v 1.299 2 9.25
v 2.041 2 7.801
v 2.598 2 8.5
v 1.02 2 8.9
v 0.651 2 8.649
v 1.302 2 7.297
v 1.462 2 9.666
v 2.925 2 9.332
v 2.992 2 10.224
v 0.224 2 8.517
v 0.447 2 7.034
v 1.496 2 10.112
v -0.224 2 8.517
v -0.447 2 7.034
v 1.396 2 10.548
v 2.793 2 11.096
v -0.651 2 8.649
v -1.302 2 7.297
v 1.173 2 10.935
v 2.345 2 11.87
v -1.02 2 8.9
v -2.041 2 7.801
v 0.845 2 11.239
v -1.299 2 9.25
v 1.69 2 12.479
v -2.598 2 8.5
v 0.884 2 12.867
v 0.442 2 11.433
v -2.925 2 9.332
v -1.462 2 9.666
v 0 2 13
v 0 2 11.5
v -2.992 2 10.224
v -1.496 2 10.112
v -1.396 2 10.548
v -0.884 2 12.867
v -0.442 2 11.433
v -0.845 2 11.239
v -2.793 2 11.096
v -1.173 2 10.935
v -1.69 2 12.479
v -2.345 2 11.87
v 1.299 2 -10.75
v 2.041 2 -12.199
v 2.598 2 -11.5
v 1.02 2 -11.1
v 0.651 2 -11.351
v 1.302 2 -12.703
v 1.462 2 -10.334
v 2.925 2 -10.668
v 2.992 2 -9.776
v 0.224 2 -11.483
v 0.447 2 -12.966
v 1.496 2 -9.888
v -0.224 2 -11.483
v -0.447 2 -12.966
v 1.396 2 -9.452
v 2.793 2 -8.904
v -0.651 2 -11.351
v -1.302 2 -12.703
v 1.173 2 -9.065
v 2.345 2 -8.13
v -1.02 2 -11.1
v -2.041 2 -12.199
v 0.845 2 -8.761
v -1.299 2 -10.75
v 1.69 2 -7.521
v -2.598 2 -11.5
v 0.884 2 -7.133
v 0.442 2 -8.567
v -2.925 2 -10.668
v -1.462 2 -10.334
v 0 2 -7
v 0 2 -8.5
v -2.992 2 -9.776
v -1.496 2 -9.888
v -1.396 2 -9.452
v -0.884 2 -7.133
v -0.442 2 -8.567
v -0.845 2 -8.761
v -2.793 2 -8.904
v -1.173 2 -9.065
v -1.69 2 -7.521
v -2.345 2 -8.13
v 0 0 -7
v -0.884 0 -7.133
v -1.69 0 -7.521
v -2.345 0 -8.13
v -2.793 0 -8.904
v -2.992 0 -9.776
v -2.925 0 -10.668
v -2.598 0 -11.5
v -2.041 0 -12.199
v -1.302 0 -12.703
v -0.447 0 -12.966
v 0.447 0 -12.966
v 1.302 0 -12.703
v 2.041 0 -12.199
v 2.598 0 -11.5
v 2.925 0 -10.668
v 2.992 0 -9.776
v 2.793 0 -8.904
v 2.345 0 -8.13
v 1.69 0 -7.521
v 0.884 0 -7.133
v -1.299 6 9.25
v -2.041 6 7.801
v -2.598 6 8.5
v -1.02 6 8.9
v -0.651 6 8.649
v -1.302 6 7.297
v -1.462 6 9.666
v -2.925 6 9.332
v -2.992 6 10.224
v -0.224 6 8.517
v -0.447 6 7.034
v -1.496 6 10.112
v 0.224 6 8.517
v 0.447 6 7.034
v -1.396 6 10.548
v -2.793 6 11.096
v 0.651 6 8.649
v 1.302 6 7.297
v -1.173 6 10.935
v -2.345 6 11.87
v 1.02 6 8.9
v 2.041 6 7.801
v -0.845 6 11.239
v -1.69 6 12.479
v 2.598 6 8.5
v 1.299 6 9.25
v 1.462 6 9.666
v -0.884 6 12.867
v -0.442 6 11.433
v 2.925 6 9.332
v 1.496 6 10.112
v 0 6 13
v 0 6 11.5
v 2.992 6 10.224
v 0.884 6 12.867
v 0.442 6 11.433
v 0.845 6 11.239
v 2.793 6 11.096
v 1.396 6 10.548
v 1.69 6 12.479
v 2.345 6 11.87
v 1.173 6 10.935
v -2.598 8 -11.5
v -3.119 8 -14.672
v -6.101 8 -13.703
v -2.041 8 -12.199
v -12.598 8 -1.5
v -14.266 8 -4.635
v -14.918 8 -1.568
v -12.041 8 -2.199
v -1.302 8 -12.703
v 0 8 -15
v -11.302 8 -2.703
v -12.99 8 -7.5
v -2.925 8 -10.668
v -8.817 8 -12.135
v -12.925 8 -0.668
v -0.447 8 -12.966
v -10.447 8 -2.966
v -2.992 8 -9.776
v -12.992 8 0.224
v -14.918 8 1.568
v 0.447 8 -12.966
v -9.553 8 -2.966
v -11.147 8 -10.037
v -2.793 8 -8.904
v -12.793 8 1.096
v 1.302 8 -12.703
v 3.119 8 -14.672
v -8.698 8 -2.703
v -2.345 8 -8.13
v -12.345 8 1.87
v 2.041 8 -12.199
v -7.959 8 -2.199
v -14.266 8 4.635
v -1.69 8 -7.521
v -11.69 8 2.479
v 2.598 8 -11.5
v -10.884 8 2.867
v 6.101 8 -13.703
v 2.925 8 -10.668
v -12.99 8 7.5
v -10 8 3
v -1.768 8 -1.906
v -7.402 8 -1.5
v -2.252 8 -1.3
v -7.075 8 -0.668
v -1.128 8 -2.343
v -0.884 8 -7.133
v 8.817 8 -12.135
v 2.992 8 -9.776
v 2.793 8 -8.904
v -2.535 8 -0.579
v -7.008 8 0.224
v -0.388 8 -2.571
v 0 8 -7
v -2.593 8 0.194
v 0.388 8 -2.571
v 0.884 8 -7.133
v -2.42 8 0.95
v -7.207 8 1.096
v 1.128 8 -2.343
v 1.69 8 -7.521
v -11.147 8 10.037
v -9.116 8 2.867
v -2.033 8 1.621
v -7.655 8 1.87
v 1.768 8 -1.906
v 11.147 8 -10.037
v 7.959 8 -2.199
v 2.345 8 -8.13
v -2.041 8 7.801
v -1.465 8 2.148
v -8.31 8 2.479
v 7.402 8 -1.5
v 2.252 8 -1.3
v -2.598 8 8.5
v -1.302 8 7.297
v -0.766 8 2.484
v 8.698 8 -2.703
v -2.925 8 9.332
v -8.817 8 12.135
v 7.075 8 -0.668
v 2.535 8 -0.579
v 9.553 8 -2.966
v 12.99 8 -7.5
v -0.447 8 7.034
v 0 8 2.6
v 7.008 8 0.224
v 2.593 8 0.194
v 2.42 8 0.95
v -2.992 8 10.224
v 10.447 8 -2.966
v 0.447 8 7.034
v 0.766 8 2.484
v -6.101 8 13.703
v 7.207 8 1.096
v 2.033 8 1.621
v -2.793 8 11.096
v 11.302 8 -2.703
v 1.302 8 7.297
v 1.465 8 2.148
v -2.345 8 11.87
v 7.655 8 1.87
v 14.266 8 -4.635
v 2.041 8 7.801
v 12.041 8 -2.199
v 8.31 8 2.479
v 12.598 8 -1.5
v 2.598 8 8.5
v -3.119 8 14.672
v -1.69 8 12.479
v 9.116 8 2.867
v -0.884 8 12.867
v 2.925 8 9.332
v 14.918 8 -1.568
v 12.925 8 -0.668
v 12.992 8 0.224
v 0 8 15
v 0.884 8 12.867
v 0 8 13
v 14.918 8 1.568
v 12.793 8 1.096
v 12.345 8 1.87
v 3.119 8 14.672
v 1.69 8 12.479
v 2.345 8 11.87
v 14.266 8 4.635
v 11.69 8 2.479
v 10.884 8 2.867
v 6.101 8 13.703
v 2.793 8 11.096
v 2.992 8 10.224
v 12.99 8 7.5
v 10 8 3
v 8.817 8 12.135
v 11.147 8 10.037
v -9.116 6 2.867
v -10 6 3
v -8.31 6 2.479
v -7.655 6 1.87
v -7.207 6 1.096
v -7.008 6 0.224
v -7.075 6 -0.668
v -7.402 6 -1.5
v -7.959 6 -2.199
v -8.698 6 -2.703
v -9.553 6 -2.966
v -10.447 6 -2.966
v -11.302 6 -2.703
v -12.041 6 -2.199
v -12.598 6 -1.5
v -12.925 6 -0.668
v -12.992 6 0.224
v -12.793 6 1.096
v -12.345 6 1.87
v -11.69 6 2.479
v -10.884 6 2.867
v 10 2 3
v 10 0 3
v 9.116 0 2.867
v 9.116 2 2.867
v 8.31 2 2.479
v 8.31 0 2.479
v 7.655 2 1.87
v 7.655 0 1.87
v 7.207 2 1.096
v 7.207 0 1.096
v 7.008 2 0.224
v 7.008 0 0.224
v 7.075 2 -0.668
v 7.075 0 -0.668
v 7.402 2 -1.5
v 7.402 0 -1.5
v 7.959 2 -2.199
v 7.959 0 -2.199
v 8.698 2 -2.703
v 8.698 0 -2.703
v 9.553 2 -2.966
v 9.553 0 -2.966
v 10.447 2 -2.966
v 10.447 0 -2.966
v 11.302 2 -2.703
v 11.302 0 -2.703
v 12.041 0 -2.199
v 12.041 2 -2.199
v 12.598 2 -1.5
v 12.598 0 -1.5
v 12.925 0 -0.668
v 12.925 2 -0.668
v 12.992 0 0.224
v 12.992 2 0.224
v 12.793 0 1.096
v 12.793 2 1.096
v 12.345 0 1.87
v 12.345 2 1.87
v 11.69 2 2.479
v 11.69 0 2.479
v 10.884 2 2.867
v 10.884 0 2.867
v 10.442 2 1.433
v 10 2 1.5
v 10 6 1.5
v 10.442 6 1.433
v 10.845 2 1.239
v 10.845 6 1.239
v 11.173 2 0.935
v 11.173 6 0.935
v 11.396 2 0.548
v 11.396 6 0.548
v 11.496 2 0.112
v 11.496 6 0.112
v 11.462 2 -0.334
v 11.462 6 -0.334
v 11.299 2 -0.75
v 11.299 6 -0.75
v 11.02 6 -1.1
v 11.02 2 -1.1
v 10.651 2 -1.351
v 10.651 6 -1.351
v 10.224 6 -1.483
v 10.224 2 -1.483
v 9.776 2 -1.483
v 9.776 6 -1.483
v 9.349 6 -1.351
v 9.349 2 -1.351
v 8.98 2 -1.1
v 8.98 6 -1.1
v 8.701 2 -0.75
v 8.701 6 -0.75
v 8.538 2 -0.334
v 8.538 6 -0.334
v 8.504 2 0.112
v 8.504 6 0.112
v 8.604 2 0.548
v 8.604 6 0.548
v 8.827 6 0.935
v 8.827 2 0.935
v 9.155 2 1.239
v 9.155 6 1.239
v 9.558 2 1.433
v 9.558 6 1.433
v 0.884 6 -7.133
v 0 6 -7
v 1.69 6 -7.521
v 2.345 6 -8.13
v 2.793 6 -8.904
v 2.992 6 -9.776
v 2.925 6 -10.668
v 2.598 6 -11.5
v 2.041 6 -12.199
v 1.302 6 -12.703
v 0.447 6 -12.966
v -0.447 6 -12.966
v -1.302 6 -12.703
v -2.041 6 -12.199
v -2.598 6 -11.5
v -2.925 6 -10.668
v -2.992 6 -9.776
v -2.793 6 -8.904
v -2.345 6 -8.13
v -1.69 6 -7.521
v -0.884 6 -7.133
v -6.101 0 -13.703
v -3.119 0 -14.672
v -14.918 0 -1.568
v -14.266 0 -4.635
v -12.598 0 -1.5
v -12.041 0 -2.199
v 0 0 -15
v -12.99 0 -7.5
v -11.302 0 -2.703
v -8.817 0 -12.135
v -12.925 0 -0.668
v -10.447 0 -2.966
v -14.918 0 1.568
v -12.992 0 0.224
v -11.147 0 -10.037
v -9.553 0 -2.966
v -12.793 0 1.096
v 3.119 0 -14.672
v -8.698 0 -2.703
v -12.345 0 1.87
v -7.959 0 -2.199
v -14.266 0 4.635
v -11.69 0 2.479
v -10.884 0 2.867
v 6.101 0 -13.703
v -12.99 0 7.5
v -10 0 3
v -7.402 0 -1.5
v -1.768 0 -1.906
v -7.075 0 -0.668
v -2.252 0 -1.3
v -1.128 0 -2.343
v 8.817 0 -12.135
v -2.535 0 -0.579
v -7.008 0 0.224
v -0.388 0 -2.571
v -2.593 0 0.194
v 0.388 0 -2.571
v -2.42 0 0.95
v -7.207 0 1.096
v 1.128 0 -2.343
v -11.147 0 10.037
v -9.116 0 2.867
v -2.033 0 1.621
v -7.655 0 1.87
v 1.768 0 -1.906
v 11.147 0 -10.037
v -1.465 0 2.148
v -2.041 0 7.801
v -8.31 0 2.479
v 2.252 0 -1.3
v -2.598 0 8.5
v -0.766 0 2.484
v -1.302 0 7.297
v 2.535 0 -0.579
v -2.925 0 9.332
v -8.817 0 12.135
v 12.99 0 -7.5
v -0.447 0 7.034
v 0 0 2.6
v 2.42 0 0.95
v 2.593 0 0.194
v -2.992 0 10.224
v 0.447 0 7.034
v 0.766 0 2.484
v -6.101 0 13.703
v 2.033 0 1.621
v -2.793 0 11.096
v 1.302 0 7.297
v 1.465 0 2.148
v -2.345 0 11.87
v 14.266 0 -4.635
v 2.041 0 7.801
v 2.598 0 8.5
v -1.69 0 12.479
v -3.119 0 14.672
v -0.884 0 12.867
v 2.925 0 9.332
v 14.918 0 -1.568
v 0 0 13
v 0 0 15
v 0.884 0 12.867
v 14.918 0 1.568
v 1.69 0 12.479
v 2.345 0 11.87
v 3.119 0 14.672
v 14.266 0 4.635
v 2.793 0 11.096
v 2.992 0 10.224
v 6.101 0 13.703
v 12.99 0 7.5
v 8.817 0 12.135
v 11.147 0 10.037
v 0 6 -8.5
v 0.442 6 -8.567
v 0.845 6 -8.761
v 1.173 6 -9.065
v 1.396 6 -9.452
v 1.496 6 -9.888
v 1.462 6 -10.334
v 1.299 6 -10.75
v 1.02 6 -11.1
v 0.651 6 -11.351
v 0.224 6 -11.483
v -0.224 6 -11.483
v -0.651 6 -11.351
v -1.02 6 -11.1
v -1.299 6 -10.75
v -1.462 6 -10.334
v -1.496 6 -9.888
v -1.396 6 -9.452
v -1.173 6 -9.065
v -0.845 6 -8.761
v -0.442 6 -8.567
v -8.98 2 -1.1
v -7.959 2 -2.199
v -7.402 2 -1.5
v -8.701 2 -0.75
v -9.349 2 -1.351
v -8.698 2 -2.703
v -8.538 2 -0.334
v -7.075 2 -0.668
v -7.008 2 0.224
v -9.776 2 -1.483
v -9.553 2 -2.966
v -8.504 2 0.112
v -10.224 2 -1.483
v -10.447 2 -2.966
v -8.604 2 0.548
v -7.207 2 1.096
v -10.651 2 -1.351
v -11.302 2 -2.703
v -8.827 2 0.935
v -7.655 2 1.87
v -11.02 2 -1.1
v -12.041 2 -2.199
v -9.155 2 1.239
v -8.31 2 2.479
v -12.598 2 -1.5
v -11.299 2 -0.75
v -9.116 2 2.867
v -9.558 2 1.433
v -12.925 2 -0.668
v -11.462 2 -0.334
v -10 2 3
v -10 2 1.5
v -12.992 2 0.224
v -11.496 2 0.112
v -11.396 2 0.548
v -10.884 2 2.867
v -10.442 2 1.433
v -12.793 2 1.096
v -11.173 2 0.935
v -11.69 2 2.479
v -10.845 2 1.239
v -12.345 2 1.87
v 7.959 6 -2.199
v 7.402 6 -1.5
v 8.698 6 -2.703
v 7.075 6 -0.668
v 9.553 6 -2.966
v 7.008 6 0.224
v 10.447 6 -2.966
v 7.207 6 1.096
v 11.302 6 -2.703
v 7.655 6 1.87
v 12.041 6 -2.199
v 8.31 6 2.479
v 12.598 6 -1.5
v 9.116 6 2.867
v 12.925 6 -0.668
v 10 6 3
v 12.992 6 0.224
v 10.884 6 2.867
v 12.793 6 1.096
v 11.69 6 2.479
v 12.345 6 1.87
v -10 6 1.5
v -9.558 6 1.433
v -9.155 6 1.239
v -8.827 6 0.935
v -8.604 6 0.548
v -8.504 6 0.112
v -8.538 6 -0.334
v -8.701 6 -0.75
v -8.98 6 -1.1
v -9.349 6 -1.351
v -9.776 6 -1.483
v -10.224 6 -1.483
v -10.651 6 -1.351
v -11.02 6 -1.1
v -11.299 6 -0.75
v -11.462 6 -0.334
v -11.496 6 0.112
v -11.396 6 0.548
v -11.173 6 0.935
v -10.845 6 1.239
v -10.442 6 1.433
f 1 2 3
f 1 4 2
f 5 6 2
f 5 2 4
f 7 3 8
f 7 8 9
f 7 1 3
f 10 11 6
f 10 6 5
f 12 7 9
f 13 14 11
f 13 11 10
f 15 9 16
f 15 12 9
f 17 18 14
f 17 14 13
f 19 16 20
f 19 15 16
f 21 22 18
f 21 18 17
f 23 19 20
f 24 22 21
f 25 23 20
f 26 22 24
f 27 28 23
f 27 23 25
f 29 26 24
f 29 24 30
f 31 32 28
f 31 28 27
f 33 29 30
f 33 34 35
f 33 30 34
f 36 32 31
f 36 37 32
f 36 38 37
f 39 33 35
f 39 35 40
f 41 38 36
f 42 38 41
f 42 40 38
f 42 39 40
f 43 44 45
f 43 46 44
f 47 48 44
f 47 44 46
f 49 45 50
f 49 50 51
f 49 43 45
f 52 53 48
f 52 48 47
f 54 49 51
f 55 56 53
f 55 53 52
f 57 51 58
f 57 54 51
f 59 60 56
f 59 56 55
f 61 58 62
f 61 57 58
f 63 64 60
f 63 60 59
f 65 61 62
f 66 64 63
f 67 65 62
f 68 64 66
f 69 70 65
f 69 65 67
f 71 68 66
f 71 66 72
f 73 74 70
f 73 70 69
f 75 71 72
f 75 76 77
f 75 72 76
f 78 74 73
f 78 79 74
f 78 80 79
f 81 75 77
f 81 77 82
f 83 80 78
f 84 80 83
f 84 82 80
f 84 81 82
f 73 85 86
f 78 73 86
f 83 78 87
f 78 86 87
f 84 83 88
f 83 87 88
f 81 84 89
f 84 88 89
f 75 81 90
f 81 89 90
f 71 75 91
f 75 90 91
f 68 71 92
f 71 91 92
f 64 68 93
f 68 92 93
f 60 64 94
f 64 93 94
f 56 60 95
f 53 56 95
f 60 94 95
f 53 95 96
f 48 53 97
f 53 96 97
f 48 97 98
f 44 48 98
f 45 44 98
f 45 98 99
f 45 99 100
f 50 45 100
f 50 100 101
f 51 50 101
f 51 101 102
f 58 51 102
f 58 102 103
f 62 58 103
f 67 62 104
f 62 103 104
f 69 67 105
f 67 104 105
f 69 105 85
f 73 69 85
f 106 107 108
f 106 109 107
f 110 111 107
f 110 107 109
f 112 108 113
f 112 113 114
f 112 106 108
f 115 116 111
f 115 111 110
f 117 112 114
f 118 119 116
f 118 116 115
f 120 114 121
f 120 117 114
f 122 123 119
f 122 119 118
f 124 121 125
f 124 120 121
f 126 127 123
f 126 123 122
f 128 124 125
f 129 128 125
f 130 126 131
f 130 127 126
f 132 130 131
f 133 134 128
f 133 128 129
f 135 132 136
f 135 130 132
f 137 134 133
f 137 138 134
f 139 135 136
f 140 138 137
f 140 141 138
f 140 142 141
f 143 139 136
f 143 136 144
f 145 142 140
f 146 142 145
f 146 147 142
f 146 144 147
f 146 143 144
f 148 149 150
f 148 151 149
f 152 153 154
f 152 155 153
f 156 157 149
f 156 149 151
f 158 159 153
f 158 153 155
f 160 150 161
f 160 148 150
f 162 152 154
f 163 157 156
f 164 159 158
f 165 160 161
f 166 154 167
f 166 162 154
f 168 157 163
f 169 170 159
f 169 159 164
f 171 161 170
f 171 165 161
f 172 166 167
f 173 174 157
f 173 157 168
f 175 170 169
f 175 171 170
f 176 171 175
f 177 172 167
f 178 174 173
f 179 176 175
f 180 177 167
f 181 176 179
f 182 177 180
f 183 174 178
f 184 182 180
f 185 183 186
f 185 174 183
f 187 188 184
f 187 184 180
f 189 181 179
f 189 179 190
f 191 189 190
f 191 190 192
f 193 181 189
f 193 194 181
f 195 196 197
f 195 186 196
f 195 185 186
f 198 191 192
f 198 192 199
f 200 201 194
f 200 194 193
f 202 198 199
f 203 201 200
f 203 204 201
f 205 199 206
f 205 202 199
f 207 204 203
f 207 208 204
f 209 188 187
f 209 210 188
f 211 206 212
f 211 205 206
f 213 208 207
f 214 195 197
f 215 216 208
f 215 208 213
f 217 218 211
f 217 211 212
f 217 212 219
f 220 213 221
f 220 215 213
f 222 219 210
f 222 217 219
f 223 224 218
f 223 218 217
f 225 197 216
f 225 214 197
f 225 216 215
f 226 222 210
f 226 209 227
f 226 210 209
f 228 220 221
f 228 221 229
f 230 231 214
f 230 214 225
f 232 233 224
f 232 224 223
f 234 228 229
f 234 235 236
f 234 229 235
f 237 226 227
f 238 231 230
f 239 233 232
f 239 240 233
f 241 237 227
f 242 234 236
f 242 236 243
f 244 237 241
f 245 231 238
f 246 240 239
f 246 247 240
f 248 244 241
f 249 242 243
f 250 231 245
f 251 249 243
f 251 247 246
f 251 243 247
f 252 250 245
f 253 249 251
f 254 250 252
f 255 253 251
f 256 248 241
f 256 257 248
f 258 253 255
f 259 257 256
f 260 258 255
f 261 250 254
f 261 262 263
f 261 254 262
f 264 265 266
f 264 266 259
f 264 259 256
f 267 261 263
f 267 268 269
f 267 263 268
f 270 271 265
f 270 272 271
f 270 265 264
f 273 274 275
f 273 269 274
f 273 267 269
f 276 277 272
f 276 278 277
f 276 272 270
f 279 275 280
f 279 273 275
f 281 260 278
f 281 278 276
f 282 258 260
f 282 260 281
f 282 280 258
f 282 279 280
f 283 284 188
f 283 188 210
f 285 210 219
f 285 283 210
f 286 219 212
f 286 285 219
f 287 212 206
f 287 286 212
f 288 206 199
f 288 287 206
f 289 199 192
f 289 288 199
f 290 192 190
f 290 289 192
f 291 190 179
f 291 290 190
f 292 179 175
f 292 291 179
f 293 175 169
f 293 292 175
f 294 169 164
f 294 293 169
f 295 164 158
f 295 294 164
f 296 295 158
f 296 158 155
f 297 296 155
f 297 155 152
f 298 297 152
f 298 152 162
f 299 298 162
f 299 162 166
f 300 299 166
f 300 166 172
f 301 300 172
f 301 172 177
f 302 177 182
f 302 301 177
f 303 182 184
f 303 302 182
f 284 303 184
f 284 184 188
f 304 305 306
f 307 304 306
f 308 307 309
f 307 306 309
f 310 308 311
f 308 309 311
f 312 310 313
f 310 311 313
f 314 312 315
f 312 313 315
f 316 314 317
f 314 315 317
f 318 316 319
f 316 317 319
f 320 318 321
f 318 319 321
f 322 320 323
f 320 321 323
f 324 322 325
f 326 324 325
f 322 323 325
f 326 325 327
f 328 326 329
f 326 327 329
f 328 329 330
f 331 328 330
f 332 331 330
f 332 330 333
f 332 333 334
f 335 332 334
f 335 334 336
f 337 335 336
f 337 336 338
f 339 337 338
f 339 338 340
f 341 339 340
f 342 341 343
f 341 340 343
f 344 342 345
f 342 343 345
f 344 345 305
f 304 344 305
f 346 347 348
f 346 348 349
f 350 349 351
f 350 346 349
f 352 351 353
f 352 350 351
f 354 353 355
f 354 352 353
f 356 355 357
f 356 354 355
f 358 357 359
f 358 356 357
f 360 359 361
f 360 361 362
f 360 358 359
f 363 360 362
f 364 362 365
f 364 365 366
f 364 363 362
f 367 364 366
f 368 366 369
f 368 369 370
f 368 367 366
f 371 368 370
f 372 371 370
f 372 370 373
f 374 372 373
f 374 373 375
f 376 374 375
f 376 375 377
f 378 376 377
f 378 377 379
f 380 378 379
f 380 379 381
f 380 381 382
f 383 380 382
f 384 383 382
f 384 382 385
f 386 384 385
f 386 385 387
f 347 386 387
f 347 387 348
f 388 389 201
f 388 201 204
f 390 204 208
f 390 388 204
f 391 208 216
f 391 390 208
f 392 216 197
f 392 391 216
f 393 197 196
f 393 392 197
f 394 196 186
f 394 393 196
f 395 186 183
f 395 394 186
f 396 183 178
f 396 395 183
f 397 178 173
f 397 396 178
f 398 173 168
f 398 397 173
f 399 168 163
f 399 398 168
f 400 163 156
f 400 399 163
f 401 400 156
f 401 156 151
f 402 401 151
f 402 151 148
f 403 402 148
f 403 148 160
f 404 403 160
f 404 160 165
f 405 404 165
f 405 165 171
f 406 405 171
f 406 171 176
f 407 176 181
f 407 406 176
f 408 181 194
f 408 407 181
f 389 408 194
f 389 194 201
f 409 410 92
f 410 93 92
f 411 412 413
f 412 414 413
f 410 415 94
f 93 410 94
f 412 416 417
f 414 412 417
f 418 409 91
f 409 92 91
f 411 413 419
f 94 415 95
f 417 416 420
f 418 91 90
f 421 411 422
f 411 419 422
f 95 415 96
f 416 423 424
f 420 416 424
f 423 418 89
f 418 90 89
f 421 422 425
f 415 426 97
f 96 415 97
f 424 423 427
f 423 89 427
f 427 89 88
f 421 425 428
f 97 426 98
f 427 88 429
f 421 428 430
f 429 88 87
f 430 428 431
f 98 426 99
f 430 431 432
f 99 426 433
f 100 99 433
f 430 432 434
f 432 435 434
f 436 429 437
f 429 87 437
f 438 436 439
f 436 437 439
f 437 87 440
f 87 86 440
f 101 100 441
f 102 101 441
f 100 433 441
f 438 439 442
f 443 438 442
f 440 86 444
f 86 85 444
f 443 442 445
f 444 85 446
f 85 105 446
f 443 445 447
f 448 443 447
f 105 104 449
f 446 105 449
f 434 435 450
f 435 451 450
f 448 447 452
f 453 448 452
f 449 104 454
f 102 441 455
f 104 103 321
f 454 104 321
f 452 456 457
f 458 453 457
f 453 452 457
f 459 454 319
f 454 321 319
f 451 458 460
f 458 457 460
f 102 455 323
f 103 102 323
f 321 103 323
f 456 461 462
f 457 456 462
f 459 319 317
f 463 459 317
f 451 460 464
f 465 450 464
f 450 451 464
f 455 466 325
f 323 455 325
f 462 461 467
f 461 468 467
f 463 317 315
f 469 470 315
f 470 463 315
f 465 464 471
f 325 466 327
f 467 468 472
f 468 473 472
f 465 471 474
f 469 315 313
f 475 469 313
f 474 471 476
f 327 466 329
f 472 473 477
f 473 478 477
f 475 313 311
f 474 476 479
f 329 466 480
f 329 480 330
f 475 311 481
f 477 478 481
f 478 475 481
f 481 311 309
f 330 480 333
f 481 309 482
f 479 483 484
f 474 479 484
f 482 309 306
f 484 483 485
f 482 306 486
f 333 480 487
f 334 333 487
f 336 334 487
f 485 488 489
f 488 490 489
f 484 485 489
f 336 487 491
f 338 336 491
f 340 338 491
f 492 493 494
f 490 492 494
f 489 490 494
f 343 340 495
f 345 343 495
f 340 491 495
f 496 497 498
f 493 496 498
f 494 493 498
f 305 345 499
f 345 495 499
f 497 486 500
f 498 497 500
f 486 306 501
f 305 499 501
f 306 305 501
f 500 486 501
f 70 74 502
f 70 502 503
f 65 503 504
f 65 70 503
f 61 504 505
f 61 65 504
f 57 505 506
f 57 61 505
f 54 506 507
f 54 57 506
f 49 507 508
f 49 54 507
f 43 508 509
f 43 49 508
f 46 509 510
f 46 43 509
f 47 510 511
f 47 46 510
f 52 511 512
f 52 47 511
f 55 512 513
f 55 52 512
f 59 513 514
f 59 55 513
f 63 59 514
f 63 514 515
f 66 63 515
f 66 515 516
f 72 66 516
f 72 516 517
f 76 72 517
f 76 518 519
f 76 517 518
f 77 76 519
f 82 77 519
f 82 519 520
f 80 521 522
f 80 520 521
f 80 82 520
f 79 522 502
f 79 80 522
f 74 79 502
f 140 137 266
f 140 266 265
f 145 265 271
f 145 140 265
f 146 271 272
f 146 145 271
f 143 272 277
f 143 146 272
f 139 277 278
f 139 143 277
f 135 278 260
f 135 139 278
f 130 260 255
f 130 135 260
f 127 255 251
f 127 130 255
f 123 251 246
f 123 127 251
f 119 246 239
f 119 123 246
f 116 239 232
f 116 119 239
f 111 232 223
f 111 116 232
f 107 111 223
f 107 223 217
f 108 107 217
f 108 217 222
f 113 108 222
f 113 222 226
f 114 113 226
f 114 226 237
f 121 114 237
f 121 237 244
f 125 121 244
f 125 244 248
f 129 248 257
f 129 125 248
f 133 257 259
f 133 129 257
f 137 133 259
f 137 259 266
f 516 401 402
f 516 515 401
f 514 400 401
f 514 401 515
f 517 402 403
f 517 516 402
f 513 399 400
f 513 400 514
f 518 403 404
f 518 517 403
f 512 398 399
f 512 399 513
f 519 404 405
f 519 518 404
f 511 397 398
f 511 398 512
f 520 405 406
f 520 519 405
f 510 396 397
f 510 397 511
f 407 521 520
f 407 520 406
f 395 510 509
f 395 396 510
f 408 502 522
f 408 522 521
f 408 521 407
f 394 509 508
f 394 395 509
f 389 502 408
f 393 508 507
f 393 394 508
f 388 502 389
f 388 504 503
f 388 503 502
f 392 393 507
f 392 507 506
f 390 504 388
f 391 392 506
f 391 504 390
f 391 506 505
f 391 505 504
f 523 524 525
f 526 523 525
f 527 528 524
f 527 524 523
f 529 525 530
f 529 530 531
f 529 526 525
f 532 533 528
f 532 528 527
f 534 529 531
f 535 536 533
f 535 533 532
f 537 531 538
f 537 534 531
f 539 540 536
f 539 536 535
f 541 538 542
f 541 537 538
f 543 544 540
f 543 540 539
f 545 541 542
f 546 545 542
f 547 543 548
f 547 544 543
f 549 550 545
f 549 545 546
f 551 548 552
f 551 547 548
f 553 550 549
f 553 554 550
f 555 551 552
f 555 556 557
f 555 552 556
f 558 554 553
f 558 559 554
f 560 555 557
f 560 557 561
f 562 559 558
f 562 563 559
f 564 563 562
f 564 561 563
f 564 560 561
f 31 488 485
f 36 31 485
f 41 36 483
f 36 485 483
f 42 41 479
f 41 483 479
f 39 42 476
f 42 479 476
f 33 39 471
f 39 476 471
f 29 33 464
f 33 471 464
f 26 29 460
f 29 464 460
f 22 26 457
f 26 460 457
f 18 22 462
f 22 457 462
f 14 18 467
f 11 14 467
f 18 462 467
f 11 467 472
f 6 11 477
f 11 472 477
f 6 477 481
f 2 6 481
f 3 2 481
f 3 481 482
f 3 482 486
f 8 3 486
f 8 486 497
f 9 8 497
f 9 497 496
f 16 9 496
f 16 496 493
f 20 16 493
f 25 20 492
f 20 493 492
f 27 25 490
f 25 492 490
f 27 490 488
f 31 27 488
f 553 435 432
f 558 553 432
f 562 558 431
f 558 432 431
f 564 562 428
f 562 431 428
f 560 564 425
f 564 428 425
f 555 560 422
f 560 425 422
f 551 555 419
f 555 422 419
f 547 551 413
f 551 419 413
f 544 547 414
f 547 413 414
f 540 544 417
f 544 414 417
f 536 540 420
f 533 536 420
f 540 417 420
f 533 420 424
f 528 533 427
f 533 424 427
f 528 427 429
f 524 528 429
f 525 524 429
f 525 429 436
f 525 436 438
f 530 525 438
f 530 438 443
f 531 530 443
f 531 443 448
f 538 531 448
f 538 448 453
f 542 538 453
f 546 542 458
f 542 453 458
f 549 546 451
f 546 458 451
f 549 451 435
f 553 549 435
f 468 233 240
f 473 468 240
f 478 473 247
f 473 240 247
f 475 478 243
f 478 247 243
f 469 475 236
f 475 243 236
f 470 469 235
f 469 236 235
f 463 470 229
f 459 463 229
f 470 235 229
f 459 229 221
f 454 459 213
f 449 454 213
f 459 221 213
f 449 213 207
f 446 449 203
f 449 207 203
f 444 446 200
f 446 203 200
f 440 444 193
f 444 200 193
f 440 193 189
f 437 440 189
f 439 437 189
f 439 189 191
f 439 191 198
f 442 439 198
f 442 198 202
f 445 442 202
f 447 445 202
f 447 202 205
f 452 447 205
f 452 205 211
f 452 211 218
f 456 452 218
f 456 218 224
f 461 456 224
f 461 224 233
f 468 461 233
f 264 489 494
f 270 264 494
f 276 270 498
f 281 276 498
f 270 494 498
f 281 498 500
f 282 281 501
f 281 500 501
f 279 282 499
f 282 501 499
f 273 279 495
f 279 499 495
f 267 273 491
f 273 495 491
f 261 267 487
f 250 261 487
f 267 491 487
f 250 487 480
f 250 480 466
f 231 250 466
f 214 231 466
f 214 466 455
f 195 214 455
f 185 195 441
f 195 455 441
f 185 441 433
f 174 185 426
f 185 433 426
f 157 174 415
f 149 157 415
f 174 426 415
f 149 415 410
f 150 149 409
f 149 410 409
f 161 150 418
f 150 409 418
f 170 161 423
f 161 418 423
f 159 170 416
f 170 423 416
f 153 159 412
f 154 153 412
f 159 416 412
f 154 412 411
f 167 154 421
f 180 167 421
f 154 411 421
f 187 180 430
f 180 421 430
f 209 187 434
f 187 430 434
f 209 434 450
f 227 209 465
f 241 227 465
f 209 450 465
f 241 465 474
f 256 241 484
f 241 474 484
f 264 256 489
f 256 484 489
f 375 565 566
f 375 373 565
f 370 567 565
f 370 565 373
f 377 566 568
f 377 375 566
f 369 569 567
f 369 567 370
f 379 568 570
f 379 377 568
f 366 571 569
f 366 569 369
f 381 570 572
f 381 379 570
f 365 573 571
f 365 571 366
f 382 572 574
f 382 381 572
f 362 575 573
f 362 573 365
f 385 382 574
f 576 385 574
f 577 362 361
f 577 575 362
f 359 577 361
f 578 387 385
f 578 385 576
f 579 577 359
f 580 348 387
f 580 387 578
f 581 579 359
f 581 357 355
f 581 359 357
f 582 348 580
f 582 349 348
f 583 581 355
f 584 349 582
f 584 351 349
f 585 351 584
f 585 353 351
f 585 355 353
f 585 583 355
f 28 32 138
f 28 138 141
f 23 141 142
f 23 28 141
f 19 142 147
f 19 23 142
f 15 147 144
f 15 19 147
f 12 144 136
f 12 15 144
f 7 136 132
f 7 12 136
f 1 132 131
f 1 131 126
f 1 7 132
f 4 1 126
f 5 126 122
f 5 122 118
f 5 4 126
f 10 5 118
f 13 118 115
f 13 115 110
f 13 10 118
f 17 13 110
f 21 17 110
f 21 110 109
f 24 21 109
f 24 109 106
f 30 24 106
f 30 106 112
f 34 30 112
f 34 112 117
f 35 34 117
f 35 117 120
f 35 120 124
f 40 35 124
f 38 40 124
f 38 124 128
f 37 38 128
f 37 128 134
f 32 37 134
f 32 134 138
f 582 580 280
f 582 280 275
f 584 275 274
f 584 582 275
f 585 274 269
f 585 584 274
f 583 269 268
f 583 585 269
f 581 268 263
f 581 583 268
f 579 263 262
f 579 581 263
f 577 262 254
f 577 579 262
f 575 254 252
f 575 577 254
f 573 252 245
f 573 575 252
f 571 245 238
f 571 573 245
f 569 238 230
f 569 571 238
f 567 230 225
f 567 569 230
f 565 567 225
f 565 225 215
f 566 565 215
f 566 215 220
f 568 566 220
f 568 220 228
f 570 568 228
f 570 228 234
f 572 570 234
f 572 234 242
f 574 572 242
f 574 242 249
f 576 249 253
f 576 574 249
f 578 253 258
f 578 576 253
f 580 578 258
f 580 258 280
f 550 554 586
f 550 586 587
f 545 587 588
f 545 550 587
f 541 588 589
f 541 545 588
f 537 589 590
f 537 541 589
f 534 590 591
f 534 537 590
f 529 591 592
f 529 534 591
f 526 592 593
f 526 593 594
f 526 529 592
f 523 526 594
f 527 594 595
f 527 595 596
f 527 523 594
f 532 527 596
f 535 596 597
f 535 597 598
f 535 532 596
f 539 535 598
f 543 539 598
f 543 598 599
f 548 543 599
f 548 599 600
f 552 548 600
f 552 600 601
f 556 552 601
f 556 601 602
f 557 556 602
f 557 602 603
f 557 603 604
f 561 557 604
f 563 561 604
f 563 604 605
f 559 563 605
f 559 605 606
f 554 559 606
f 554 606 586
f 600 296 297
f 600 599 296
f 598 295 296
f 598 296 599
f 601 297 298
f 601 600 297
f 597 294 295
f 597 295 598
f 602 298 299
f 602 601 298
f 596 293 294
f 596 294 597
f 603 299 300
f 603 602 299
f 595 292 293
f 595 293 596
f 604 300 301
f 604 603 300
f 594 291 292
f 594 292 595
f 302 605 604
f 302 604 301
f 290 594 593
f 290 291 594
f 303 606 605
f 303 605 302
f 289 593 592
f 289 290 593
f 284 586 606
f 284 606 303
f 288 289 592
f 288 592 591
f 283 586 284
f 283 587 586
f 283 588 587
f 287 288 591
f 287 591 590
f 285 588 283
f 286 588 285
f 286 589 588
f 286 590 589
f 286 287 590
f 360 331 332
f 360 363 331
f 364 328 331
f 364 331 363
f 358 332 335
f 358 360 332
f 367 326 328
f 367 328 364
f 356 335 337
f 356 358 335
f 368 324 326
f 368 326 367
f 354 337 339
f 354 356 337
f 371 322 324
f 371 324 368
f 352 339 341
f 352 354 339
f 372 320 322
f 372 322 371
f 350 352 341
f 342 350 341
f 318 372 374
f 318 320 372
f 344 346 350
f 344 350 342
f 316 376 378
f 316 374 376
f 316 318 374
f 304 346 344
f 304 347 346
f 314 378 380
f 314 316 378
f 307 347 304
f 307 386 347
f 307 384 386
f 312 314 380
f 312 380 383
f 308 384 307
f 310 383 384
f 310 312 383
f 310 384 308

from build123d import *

# Parameters (mm, degrees)
SKETCH1_R           = 15
SKETCH1_R_2         = 1.5
BOSS_EXTRUDE1_DEPTH = 8
SKETCH2_R           = 2.6
CUT_EXTRUDE1_DEPTH  = 23.671568098
CUT_EXTRUDE2_START  = -2
SKETCH3_R           = 3
SKETCH3_R_2         = 1.5
CUT_EXTRUDE2_DEPTH  = 2
SKETCH4_R           = 3
CUT_EXTRUDE3_DEPTH  = 2


with BuildPart() as part:
    # Sketch1 → Boss-Extrude1 (new body)
    with BuildSketch(Plane(origin=(0, 0, 0), x_dir=(1, 0, 0), z_dir=(0, 1, 0))):
        with Locations(Location((0, 0, 0), (0, 0, 270))):
            Circle(SKETCH1_R)
        with Locations(Location((0, 10, 0), (0, 0, 270))):
            Circle(SKETCH1_R_2, mode=Mode.SUBTRACT)
        with Locations(Location((10, 0, 0), (0, 0, 270))):
            Circle(SKETCH1_R_2, mode=Mode.SUBTRACT)
        with Locations(Location((0, -10, 0), (0, 0, 270))):
            Circle(SKETCH1_R_2, mode=Mode.SUBTRACT)
        with Locations(Location((-10, 0, 0), (0, 0, 270))):
            Circle(SKETCH1_R_2, mode=Mode.SUBTRACT)
    extrude(amount=BOSS_EXTRUDE1_DEPTH)

    # Sketch2 → Cut-Extrude1 (cut, through all)
    with BuildSketch(Plane(origin=(0, 8, 0), x_dir=(1, 0, 0), z_dir=(0, 1, 0))):
        with Locations(Location((0, 0, 0), (0, 0, 270))):
            Circle(SKETCH2_R)
    extrude(amount=-CUT_EXTRUDE1_DEPTH, mode=Mode.SUBTRACT)

    # Sketch3 → Cut-Extrude2 (cut)
    # profile 1 of 4: a face of its own
    with BuildSketch(Plane(origin=(0, 8, 0), x_dir=(1, 0, 0), z_dir=(0, 1, 0)).offset(CUT_EXTRUDE2_START)):
        with Locations(Location((-10, 0, 0), (0, 0, 270))):
            Circle(SKETCH3_R)
        with Locations(Location((-10, 0, 0), (0, 0, 270))):
            Circle(SKETCH3_R_2, mode=Mode.SUBTRACT)
    # profile 2 of 4: a face of its own
    with BuildSketch(Plane(origin=(0, 8, 0), x_dir=(1, 0, 0), z_dir=(0, 1, 0)).offset(CUT_EXTRUDE2_START)):
        with Locations(Location((0, -10, 0), (0, 0, 270))):
            Circle(SKETCH3_R)
        with Locations(Location((0, -10, 0), (0, 0, 270))):
            Circle(SKETCH3_R_2, mode=Mode.SUBTRACT)
    # profile 3 of 4: a face of its own
    with BuildSketch(Plane(origin=(0, 8, 0), x_dir=(1, 0, 0), z_dir=(0, 1, 0)).offset(CUT_EXTRUDE2_START)):
        with Locations(Location((10, 0, 0), (0, 0, 270))):
            Circle(SKETCH3_R)
        with Locations(Location((10, 0, 0), (0, 0, 270))):
            Circle(SKETCH3_R_2, mode=Mode.SUBTRACT)
    # profile 4 of 4: a face of its own
    with BuildSketch(Plane(origin=(0, 8, 0), x_dir=(1, 0, 0), z_dir=(0, 1, 0)).offset(CUT_EXTRUDE2_START)):
        with Locations(Location((0, 10, 0), (0, 0, 270))):
            Circle(SKETCH3_R)
    extrude(amount=CUT_EXTRUDE2_DEPTH, mode=Mode.SUBTRACT)

    # Sketch4 → Cut-Extrude3 (cut)
    with BuildSketch(Plane.XZ):
        with Locations(Location((0, 10, 0), (0, 0, 90))):
            Circle(SKETCH4_R)
        with Locations(Location((10, 0, 0), (0, 0, 90))):
            Circle(SKETCH4_R)
        with Locations(Location((0, -10, 0), (0, 0, 90))):
            Circle(SKETCH4_R)
        with Locations(Location((-10, 0, 0), (0, 0, 90))):
            Circle(SKETCH4_R)
    extrude(amount=-CUT_EXTRUDE3_DEPTH, mode=Mode.SUBTRACT)


solid = part.part
